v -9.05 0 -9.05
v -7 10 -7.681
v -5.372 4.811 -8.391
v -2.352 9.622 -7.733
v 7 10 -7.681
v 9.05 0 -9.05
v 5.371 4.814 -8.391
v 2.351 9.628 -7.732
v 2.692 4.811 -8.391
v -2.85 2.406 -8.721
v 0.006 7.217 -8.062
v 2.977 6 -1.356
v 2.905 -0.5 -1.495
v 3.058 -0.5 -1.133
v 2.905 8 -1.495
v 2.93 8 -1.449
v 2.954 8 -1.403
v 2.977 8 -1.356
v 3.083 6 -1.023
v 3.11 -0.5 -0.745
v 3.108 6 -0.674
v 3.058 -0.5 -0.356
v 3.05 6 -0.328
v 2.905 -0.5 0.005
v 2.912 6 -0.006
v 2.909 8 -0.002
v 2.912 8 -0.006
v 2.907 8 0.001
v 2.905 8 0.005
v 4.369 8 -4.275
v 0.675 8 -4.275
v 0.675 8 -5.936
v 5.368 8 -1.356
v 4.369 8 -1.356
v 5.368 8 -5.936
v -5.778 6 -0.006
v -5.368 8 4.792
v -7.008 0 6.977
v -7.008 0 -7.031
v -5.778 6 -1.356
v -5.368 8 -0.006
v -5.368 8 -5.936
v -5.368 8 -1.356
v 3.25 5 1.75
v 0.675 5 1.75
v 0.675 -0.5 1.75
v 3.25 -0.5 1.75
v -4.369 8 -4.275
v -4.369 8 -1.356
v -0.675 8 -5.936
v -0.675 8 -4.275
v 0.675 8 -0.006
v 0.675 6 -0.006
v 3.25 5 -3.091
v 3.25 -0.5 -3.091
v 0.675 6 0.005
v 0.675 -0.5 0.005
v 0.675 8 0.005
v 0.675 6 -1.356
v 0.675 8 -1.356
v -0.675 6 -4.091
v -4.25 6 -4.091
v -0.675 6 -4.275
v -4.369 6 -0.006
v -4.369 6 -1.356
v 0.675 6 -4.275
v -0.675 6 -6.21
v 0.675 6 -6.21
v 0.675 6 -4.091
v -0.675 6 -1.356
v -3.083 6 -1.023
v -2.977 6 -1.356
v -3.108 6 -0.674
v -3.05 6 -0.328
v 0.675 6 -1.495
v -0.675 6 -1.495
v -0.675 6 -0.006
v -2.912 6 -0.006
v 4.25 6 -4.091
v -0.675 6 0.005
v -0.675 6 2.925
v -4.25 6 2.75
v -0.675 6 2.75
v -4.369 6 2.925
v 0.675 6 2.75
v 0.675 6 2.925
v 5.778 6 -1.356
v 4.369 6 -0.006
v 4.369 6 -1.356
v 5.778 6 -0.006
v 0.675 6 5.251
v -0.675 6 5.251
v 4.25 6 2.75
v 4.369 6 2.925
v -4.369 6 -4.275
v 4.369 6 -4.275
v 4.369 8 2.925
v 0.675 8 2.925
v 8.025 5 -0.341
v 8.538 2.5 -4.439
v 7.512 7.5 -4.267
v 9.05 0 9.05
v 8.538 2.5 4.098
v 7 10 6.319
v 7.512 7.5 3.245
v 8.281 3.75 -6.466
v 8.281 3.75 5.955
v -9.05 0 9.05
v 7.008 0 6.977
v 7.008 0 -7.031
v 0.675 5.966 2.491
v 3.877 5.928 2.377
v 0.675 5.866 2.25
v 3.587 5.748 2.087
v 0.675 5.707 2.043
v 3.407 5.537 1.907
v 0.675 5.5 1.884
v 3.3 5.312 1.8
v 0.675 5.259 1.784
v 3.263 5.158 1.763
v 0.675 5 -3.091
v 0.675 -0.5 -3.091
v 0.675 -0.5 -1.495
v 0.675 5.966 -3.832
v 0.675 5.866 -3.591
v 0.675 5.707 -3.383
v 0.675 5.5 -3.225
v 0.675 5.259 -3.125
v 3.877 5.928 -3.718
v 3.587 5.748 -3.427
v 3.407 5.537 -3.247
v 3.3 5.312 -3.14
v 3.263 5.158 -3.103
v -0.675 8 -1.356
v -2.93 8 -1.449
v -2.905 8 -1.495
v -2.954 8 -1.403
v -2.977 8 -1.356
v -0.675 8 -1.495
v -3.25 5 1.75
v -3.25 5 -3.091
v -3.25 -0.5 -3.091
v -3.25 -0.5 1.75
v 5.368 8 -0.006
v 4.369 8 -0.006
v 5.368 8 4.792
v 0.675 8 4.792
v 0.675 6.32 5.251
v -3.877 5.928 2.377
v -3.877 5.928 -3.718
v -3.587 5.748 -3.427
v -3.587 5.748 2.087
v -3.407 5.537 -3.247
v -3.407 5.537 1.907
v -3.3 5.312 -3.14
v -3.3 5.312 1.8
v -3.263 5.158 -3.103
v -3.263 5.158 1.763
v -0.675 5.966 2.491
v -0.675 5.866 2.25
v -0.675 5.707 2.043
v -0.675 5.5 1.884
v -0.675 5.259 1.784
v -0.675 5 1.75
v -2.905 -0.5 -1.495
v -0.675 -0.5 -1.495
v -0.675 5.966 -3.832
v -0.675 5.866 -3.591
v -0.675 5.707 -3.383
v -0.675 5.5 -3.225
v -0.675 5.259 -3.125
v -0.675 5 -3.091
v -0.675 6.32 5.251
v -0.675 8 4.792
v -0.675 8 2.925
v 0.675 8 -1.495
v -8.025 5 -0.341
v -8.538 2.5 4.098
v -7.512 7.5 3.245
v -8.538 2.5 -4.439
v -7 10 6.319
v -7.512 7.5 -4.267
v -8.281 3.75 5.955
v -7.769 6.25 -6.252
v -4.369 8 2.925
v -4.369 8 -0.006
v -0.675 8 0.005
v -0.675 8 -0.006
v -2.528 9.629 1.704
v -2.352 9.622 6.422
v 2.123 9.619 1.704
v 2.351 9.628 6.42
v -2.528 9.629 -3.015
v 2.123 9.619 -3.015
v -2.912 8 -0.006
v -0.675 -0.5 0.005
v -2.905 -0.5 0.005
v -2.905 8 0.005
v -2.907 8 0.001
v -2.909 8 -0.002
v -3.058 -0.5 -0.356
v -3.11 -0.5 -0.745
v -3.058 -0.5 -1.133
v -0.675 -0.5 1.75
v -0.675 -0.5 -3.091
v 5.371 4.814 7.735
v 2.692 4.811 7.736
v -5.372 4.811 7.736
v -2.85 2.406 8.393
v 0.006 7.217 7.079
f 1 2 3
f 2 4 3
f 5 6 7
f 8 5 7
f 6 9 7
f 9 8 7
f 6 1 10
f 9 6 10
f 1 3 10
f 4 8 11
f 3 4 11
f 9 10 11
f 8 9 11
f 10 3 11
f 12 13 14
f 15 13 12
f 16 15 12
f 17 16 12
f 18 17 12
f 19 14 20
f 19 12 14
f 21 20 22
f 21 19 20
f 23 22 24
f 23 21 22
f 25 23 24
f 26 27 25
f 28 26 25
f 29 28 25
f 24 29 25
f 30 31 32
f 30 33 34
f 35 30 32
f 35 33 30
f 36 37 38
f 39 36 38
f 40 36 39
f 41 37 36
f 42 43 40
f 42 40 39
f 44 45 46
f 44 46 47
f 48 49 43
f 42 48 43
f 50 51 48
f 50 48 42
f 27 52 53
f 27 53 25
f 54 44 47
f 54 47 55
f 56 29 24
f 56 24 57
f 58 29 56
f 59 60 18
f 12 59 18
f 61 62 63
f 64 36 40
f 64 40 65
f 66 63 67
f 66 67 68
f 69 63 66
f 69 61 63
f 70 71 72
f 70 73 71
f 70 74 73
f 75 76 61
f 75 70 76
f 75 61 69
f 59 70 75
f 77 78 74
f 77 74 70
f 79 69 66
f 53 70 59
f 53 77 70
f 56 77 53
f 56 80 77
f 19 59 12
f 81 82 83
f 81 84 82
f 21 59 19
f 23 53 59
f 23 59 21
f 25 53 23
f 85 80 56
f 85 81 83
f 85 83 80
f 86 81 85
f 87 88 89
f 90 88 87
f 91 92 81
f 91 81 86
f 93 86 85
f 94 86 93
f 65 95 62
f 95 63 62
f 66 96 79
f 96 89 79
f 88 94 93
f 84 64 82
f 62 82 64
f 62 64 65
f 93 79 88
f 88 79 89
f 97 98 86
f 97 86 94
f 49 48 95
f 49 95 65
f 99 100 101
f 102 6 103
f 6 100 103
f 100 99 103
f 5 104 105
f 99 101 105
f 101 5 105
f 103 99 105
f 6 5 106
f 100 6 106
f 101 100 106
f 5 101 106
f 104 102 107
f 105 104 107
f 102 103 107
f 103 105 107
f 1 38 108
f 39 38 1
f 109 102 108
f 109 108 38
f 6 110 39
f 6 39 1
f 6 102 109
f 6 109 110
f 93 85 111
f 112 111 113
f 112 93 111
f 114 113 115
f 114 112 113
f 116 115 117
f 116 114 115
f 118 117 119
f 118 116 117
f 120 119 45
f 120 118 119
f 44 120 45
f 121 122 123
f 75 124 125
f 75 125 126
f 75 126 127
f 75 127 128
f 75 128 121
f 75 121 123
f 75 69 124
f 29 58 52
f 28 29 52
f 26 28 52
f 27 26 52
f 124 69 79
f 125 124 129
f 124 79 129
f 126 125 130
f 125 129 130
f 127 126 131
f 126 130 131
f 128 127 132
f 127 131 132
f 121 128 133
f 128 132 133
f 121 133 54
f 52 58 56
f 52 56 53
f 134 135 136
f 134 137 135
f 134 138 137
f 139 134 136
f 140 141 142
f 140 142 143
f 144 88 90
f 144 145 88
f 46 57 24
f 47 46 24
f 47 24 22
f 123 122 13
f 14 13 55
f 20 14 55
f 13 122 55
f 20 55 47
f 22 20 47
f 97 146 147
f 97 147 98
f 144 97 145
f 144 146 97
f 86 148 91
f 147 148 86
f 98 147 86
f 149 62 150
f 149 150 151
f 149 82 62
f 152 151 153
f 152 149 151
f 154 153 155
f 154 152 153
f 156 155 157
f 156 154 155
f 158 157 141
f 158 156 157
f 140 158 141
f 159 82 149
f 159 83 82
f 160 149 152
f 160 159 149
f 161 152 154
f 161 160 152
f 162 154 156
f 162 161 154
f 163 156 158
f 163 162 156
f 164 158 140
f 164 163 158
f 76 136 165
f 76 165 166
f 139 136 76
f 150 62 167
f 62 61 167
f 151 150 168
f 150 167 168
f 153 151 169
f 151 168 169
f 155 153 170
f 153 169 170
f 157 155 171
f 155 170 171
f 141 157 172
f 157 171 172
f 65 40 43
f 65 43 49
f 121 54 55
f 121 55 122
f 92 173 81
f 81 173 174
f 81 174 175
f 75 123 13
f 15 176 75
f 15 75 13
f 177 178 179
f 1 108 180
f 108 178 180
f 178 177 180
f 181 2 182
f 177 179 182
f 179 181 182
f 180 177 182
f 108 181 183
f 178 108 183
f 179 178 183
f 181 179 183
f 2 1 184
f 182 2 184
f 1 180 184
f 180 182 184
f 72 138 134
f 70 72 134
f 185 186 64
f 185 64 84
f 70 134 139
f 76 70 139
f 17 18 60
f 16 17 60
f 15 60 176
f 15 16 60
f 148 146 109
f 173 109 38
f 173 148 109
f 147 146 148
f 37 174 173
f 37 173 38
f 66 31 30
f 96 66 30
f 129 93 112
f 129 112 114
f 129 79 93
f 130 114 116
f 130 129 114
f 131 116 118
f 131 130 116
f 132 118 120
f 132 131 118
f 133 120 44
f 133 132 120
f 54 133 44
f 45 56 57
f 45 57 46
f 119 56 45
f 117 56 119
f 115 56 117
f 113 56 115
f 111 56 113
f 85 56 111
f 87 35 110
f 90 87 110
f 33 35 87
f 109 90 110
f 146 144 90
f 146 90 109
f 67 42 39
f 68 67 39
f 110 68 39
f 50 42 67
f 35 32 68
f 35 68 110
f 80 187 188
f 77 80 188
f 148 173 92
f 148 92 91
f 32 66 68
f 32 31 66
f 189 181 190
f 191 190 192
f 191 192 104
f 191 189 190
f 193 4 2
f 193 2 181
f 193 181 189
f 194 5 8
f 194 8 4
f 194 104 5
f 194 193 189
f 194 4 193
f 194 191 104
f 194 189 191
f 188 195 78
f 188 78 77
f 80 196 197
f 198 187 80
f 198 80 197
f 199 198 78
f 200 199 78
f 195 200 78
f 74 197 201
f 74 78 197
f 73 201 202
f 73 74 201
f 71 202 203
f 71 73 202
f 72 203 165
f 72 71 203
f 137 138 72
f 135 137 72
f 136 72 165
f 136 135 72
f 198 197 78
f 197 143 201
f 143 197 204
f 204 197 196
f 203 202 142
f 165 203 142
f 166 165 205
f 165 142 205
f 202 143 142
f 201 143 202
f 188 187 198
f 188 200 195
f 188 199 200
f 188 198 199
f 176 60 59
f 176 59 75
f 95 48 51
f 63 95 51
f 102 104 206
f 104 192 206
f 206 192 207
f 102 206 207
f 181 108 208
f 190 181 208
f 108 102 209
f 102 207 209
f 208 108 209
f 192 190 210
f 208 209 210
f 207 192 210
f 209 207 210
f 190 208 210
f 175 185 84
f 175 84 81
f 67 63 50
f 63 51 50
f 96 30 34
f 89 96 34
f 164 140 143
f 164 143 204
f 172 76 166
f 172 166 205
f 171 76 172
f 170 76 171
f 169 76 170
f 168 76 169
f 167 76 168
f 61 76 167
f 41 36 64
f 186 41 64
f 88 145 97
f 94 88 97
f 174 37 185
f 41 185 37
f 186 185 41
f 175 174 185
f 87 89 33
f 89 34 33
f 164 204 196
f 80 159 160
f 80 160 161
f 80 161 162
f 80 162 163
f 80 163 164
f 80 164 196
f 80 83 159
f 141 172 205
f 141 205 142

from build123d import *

# Parameters (mm, degrees)
SHELL1_T                = -2
SKETCH5_W               = 1.35
SKETCH5_H               = 12.225319986
SKETCH5_W_2             = 12.114403326
SKETCH5_H_2             = 1.35
BOSS_EXTRUDE1_DEPTH     = 4
CUT_EXTRUDE3_DEPTH      = 10
CUT_EXTRUDE3_DEPTH_BACK = 10
BOSS_EXTRUDE2_START     = -0.5
BOSS_EXTRUDE2_DEPTH     = 10
BOSS_EXTRUDE2_2_DEPTH   = 10
SKETCH8_W               = 8.738759906
SKETCH8_H               = 7.199411956
SKETCH8_W_2             = 6.5
SKETCH8_H_2             = 4.831184338
BOSS_EXTRUDE4_DEPTH     = 2
FILLET4_R               = 1


with BuildPart() as part:
    # Loft1: read off the stored shape, not the designer's step
    # Loft1: loft between two sections, ruled curve by curve
    loft1_from = [
        Edge.make_line((-9.05, 0, 9.05), (-9.05, 0, -9.05)),
        Edge.make_line((-9.05, 0, -9.05), (9.05, 0, -9.05)),
        Edge.make_line((9.05, 0, 9.05), (-9.05, 0, 9.05)),
        Edge.make_line((9.05, 0, -9.05), (9.05, 0, 9.05)),
    ]
    loft1_to = [
        Edge.make_line((-7, 10, 6.318777005), (-7, 10, -7.681222995)),
        Edge.make_line((-7, 10, -7.681222995), (7, 10, -7.681222995)),
        Edge.make_line((7, 10, 6.318777005), (-7, 10, 6.318777005)),
        Edge.make_line((7, 10, -7.681222995), (7, 10, 6.318777005)),
    ]
    loft1 = Solid(Shell([*[Face.make_surface_from_curves(loft1_from[k], loft1_to[k]) for k in range(4)], Face(Wire(loft1_from)), Face(Wire(loft1_to))]))
    add(loft1)

    # Shell1
    shell1_openings = [part.faces().sort_by_distance(p)[0] for p in [
        (0, 0, 0),
    ]]
    offset(amount=SHELL1_T, openings=shell1_openings, kind=Kind.INTERSECTION)

    # Sketch5 → Boss-Extrude1 (add)
    with BuildSketch(Plane(origin=(0, 10, 0), x_dir=(1, 0, 0), z_dir=(0, 1, 0))):
        with Locations((0, 0.862108036)):
            Rectangle(SKETCH5_W, SKETCH5_H)
        with Locations((0.109128691, 0.681416915)):
            Rectangle(SKETCH5_W_2, SKETCH5_H_2)
    extrude(amount=-BOSS_EXTRUDE1_DEPTH)

    # Sketch4 → Cut-Extrude3 (cut, two sides: drawn at the far end of the back side and taken through both)
    with BuildSketch(Plane.XY.offset(-CUT_EXTRUDE3_DEPTH_BACK)):
        with BuildLine():
            Line((-7, 10), (7, 10))
            add(Edge.make_bspline(
                [(-7, 10), (-2.602300298, 9.460265696), (1.993912061, 9.41154423), (7, 10)],
                knots=[0, 0, 0, 0, 1, 1, 1, 1], degree=3))
        make_face()
    extrude(amount=CUT_EXTRUDE3_DEPTH + CUT_EXTRUDE3_DEPTH_BACK, mode=Mode.SUBTRACT)



with BuildPart() as body_2:
    # Sketch6 → Boss-Extrude2 (new body)
    with BuildSketch(Plane(origin=(0, 10, 0), x_dir=(1, 0, 0), z_dir=(0, 1, 0)).offset(BOSS_EXTRUDE2_START)):
        with BuildLine():
            Line((0.675, -0.005353557), (0.675, -1.75))
            Line((0.675, -1.75), (3.25, -1.75))
            Line((3.25, -1.75), (3.25, 3.09053704))
            Line((3.25, 3.09053704), (0.675, 3.09053704))
            Line((0.675, 3.09053704), (0.675, 1.494646443))
            Line((0.675, 1.494646443), (2.90473751, 1.494646443))
            ThreePointArc((2.90473751, 1.494646443), (3.109676589, 0.744646443), (2.90473751, -0.005353557))
            Line((2.90473751, -0.005353557), (0.675, -0.005353557))
        make_face()
    extrude(amount=-BOSS_EXTRUDE2_DEPTH)


with BuildPart() as body_3:
    # Sketch6 → Boss-Extrude2 2 (new body)
    with BuildSketch(Plane(origin=(0, 10, 0), x_dir=(1, 0, 0), z_dir=(0, 1, 0)).offset(BOSS_EXTRUDE2_START)):
        with BuildLine():
            Line((-0.675, -1.75), (-0.675, -0.005353557))
            Line((-0.675, -0.005353557), (-2.90473751, -0.005353557))
            ThreePointArc((-2.90473751, -0.005353557), (-3.109676589, 0.744646443), (-2.90473751, 1.494646443))
            Line((-2.90473751, 1.494646443), (-0.675, 1.494646443))
            Line((-0.675, 1.494646443), (-0.675, 3.09053704))
            Line((-0.675, 3.09053704), (-3.25, 3.09053704))
            Line((-3.25, 3.09053704), (-3.25, -1.75))
            Line((-3.25, -1.75), (-0.675, -1.75))
        make_face()
    extrude(amount=-BOSS_EXTRUDE2_2_DEPTH)


with BuildPart() as part_1:
    add(part.part)

    add(body_2.part)  # Boss-Extrude4 merges body 2

    add(body_3.part)  # Boss-Extrude4 merges body 3
    # Sketch8 → Boss-Extrude4 (add)
    with BuildSketch(Plane(origin=(0, 8, -8), x_dir=(1, 0, 0), z_dir=(0, -1, 0))):
        with Locations((0, 7.325055129)):
            Rectangle(SKETCH8_W, SKETCH8_H)
        with Locations((0, 7.325055129)):
            Rectangle(SKETCH8_W_2, SKETCH8_H_2, mode=Mode.SUBTRACT)
    extrude(amount=BOSS_EXTRUDE4_DEPTH)

    # Fillet4
    fillet4_edges = [part_1.edges().sort_by_distance(p)[0] for p in [
        (3.25, 6, -0.67026852),
        (-3.25, 6, -0.67026852),
        (-1.9625, 6, -3.09053704),
        (1.9625, 6, -3.09053704),
        (1.9625, 6, 1.75),
        (-1.9625, 6, 1.75),
    ]]
    fillet(fillet4_edges, radius=FILLET4_R)


solid = part_1.part
